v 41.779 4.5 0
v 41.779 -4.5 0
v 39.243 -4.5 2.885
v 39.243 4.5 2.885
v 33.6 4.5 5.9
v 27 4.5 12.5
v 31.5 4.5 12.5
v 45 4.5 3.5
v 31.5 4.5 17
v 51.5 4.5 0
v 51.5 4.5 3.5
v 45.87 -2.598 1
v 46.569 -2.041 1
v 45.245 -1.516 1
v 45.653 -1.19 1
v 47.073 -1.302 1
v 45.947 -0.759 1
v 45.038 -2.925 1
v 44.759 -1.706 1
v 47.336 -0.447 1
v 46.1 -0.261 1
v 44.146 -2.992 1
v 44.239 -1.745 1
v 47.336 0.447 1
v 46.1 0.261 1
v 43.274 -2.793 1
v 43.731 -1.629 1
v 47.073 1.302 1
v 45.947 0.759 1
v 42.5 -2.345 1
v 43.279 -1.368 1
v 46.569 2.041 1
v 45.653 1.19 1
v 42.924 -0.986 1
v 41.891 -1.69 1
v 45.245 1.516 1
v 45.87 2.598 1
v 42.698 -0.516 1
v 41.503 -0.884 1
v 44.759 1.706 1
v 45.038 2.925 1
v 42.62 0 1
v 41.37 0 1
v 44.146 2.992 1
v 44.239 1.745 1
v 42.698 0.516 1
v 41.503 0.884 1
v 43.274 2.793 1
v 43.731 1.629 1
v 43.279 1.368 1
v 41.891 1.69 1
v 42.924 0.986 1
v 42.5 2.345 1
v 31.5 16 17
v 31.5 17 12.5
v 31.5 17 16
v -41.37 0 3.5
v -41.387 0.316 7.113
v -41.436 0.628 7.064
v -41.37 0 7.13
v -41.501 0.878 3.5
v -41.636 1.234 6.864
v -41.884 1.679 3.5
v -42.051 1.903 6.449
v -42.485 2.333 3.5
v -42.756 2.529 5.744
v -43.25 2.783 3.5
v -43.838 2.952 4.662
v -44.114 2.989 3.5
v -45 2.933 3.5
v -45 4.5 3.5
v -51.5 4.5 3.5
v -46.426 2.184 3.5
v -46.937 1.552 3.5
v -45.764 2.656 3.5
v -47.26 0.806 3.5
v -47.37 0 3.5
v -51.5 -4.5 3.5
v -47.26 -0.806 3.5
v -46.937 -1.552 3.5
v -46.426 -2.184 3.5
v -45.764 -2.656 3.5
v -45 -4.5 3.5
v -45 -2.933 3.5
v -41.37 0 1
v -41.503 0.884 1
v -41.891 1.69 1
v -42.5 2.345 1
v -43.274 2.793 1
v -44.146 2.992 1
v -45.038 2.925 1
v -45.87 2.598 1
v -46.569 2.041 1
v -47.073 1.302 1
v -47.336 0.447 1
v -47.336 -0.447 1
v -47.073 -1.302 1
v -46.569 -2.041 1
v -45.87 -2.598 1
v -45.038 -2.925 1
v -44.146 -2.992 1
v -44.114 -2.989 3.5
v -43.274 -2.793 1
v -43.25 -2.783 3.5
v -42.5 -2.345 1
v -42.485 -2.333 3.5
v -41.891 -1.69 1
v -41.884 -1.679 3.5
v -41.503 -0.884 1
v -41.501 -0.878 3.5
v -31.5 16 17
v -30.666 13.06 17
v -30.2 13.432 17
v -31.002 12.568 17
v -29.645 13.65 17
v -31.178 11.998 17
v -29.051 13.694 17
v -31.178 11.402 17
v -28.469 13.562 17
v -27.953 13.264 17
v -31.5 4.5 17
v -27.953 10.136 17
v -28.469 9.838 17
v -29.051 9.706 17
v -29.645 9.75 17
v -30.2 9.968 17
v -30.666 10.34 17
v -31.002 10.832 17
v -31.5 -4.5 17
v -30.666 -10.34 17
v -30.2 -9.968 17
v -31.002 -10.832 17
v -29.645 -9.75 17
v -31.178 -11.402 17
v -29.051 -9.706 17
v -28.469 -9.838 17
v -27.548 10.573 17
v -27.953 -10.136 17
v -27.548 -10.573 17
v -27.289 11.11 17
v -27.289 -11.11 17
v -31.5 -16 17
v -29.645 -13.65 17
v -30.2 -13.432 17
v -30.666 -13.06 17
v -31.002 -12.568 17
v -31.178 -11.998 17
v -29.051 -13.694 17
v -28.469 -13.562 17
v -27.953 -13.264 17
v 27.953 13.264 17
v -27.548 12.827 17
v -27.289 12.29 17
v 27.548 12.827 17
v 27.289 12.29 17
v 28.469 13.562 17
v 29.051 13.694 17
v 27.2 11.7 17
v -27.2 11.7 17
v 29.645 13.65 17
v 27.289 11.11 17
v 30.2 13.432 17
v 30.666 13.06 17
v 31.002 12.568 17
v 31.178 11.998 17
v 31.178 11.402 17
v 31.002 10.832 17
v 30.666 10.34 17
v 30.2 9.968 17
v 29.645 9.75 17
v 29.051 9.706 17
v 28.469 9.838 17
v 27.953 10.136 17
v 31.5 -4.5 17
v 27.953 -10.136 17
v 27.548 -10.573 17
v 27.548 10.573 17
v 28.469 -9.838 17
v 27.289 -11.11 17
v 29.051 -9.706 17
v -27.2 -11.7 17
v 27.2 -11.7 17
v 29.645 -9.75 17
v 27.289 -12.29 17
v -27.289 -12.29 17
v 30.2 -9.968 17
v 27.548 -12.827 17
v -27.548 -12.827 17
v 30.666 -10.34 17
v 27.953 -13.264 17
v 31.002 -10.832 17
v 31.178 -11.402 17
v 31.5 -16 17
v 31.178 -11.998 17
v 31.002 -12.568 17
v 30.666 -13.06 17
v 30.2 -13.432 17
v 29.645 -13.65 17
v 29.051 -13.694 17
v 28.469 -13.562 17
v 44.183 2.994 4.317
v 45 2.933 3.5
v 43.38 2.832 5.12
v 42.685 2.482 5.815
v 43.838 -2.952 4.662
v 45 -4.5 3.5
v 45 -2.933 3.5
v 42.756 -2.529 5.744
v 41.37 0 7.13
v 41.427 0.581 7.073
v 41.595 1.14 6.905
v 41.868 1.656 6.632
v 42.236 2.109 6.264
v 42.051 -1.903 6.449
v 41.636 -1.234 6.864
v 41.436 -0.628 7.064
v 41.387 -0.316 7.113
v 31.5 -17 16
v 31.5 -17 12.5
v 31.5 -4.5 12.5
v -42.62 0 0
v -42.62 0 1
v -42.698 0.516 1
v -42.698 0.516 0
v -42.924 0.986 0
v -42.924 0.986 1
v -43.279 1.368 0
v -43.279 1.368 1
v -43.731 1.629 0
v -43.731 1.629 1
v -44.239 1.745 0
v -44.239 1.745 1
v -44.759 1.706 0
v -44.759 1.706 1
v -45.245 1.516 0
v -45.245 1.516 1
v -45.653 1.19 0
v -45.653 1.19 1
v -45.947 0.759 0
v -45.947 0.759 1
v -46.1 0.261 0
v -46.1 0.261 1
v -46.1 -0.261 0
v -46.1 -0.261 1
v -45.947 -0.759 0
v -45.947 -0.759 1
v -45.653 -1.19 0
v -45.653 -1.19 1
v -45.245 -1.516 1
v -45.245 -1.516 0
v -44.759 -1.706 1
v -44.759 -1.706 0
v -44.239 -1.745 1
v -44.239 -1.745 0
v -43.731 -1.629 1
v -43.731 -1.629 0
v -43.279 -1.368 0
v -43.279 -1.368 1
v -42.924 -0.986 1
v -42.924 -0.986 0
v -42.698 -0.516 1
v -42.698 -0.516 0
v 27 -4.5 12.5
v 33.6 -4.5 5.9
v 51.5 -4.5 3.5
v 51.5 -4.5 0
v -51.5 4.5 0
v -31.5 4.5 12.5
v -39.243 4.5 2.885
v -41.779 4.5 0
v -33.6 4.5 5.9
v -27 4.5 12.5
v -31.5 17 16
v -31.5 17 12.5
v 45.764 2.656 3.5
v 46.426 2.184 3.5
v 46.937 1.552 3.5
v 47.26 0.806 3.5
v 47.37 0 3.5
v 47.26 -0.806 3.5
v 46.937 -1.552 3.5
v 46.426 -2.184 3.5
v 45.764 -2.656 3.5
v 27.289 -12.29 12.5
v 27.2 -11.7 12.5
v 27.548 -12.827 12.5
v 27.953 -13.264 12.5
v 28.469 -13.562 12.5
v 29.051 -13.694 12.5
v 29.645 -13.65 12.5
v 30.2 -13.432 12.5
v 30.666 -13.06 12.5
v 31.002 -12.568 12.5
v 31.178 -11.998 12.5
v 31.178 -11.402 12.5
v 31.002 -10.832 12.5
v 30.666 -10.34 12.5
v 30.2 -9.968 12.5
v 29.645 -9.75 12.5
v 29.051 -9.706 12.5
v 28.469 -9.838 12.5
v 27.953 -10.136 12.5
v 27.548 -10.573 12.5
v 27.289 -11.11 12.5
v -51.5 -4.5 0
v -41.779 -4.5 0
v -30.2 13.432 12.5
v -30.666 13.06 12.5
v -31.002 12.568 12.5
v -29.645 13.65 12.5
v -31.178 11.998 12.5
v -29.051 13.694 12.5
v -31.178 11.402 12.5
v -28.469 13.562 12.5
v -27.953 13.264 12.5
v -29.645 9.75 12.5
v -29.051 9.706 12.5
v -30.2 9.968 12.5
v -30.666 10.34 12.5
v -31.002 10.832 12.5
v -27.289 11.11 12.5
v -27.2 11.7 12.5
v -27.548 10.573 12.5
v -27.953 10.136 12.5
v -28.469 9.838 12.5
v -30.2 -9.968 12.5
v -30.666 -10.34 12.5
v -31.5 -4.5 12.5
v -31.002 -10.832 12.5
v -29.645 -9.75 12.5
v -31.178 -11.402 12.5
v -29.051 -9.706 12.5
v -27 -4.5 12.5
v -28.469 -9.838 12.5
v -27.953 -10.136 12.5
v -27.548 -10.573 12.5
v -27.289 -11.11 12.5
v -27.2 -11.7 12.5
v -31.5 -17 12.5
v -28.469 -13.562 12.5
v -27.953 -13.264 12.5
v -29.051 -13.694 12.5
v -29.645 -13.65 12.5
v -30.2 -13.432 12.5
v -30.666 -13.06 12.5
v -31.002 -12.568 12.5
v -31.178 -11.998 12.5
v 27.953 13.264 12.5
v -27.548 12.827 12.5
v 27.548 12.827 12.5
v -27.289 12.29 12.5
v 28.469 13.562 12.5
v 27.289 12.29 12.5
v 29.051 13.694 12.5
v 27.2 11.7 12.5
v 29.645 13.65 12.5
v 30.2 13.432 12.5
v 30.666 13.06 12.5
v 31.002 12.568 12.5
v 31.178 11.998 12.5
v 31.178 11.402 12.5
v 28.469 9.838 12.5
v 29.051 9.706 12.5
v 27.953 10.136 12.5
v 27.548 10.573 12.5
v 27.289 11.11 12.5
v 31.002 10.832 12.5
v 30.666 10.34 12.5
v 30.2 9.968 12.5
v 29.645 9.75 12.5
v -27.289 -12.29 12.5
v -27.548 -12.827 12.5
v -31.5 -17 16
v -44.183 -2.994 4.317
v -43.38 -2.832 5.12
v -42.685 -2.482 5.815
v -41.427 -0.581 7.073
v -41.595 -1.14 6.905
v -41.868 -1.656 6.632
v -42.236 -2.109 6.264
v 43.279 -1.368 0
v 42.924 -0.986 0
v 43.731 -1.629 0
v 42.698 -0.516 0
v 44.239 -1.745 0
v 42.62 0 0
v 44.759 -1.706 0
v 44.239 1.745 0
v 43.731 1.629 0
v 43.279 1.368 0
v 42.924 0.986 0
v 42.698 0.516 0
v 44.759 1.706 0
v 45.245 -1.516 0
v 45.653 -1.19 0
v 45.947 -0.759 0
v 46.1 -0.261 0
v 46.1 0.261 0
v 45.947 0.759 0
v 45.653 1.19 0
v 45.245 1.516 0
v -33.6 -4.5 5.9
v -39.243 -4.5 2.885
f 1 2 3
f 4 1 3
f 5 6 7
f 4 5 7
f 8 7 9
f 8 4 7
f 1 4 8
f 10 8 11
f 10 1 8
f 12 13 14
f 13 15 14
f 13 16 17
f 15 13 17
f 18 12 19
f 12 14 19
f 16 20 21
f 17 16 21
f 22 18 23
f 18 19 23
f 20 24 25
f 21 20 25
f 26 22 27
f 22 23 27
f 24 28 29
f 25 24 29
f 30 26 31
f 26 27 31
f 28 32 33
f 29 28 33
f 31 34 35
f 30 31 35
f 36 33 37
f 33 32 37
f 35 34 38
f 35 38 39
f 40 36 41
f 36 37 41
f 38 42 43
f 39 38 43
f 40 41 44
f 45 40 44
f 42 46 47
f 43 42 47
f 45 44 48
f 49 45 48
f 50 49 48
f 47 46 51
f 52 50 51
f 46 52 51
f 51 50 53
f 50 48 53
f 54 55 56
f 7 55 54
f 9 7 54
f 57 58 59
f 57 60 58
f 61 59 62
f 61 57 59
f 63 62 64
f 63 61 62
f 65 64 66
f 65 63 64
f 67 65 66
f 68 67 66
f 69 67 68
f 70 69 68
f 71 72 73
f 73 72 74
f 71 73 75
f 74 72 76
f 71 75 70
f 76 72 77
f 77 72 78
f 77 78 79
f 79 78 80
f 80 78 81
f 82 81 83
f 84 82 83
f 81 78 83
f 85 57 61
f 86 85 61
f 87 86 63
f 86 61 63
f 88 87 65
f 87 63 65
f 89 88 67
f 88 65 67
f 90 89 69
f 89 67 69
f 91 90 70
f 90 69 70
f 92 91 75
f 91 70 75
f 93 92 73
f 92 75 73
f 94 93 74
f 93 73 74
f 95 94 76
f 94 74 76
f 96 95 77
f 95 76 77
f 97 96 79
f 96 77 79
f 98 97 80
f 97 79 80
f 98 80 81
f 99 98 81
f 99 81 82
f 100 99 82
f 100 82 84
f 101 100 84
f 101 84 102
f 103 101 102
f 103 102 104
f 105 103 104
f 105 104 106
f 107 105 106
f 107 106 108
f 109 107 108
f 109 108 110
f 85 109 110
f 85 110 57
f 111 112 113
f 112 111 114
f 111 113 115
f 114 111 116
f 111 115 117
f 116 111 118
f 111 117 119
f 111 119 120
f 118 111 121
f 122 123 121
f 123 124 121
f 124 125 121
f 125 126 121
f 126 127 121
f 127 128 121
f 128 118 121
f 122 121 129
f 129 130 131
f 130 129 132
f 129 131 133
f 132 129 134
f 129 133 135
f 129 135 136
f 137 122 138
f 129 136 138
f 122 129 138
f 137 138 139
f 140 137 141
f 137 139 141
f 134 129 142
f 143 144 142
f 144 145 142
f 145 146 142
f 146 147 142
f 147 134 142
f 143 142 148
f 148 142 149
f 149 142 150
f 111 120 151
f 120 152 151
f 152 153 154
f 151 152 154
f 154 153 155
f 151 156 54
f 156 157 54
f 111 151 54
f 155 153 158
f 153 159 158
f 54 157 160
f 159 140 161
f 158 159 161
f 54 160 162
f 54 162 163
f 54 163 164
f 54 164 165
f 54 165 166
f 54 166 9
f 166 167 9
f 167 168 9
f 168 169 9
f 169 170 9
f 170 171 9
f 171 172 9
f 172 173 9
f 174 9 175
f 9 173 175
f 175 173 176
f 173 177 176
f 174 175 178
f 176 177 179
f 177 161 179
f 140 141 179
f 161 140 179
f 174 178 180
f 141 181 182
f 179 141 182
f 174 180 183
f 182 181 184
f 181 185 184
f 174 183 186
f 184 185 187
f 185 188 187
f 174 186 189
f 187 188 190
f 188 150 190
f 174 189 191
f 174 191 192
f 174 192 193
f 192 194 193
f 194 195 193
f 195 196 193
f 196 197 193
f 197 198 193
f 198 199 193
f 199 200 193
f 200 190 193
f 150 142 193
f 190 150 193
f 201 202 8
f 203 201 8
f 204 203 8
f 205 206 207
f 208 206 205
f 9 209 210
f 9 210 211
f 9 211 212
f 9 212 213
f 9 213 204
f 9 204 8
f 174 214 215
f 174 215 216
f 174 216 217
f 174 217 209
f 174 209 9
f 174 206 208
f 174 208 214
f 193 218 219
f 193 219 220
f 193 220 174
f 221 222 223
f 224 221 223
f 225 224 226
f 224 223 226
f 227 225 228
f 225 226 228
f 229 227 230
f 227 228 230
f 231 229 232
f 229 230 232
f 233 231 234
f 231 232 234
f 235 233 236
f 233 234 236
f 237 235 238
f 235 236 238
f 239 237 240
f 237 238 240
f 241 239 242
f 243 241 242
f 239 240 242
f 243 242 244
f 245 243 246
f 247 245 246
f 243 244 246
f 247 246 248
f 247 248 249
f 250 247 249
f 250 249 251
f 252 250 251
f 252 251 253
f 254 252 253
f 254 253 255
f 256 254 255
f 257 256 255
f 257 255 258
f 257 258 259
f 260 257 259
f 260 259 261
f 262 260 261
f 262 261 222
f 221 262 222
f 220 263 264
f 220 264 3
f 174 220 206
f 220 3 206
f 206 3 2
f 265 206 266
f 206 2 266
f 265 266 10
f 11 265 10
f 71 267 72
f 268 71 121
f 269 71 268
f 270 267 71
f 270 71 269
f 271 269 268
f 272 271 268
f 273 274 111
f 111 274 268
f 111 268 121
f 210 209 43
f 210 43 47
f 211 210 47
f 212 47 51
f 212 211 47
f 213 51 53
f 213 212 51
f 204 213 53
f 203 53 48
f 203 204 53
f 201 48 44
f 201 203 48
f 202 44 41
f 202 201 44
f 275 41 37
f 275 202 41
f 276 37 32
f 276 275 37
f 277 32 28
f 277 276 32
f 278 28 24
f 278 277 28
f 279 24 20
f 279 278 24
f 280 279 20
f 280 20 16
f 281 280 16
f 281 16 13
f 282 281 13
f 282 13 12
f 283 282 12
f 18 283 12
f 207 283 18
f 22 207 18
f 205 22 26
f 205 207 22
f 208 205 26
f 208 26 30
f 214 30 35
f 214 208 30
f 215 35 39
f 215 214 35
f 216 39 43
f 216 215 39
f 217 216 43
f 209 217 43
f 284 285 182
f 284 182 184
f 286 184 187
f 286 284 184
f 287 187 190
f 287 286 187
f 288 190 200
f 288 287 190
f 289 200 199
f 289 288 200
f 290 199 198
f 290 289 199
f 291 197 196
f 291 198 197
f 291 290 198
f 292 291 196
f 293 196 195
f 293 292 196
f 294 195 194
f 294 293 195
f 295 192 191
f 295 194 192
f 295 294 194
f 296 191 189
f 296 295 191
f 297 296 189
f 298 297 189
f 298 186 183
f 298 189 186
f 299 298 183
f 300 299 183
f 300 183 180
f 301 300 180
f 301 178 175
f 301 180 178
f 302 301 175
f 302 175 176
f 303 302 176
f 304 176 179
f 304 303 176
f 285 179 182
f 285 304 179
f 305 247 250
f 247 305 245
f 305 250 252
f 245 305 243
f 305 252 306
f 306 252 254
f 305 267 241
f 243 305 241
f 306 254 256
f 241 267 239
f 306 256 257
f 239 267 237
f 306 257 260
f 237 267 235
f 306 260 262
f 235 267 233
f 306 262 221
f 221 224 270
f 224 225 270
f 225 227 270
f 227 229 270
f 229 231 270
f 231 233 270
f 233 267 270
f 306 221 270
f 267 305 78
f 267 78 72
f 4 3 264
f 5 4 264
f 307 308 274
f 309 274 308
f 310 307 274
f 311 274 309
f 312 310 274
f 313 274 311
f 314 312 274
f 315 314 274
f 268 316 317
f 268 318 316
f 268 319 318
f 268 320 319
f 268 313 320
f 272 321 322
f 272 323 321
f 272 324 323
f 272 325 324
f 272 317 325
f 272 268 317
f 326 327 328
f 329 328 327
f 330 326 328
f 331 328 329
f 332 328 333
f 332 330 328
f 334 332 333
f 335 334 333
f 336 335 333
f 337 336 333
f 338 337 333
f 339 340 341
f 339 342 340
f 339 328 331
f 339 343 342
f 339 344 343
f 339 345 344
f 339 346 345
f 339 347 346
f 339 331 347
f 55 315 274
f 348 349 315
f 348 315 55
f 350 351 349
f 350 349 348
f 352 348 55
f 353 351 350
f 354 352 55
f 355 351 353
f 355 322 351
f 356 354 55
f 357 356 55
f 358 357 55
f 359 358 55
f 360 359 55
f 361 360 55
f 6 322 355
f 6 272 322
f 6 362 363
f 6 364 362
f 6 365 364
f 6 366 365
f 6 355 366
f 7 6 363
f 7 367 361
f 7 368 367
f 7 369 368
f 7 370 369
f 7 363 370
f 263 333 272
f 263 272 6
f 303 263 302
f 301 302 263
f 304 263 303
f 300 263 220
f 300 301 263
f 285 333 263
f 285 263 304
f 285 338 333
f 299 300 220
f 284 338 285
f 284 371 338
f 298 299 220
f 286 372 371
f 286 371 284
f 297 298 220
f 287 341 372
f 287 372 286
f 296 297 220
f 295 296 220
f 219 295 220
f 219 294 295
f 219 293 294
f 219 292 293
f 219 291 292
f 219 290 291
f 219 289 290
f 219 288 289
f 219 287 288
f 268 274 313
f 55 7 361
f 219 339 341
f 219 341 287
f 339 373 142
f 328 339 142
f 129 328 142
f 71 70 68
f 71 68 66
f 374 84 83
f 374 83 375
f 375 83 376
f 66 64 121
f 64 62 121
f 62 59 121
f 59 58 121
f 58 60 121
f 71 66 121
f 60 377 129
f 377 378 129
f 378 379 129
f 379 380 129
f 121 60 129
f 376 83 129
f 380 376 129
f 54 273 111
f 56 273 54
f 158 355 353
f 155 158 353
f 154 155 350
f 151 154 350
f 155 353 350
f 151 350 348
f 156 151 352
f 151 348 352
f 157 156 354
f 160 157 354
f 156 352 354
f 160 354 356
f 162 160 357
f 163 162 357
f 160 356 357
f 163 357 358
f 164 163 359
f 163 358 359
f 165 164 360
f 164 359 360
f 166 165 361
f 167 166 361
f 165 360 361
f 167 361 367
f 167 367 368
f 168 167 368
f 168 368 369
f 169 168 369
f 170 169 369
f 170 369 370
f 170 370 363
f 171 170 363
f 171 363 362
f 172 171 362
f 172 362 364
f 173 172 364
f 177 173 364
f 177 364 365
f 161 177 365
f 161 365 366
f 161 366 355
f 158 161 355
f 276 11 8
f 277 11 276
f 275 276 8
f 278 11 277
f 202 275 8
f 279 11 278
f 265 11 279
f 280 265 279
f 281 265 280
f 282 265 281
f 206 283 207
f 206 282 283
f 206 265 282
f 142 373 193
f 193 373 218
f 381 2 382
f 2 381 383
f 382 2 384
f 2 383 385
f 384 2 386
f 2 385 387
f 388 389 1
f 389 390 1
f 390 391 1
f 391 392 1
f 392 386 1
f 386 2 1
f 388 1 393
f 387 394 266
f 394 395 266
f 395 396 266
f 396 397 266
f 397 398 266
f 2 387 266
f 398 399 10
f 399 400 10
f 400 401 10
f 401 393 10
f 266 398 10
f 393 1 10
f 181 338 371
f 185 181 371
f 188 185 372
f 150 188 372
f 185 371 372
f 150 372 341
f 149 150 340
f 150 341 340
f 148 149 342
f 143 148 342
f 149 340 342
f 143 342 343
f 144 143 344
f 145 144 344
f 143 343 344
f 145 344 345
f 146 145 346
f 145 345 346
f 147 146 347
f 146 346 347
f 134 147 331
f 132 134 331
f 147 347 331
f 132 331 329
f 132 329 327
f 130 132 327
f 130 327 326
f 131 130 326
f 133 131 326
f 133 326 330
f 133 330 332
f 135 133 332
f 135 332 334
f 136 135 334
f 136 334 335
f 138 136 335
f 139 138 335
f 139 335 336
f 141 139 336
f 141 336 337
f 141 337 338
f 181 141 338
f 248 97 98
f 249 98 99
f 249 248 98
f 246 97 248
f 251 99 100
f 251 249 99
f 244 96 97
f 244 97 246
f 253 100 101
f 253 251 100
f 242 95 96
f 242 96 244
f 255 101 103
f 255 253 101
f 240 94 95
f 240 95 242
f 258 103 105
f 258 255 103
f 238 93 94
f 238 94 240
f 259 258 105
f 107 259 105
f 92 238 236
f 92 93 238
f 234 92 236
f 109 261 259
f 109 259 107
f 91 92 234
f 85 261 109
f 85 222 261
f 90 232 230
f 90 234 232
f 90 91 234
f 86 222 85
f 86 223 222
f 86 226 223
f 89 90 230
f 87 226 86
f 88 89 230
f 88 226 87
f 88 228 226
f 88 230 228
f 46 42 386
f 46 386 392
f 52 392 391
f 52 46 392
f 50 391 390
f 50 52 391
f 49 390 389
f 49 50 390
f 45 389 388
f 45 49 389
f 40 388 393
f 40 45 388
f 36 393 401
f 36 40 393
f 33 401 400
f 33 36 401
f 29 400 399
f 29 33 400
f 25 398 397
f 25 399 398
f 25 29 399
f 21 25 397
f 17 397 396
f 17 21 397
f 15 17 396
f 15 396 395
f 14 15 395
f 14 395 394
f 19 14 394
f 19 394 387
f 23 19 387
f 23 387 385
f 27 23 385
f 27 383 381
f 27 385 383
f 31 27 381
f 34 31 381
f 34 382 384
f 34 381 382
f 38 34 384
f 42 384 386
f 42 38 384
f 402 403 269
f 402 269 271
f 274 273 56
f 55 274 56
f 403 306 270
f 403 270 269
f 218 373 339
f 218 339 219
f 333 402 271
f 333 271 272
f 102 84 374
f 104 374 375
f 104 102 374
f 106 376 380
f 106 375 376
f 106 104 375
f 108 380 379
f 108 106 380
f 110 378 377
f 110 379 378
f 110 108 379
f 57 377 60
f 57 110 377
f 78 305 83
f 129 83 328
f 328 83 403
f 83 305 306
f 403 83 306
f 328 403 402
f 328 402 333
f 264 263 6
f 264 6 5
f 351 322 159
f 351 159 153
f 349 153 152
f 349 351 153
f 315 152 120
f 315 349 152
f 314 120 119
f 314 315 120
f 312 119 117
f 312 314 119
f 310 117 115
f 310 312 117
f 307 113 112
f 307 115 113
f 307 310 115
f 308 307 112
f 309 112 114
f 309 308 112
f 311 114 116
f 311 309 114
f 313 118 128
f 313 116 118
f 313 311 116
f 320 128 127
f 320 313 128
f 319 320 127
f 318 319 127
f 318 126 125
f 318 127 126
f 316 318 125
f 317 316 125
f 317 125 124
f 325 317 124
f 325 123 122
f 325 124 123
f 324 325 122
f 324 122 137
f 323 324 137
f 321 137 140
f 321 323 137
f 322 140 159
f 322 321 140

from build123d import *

# Parameters (mm, degrees)
SKETCH_W                      = 103
SKETCH_H                      = 9
PAD_DEPTH                     = 17
POCKET_DEPTH                  = 5.5
POCKET001_DEPTH               = 4.5
SKETCH003_W                   = 63
SKETCH003_H                   = 4.5
PAD001_DEPTH                  = 17
SKETCH005_R                   = 3
POCKET002_DEPTH               = 2.5
POCKET002_DEPTH_BACK          = 5
SKETCH006_R                   = 1.75
POCKET003_DEPTH               = 5
SKETCH007_R                   = 2
POCKET004_DEPTH               = 28
SKETCH007_MIRRORED002_2_R     = 2
POCKET004_MIRRORED002_2_DEPTH = 28
POCKET005_DEPTH               = 7
CHAMFER_SIZE                  = 1


with BuildPart() as part:
    # Sketch → Pad (new body)
    with BuildSketch(Plane.XY):
        Rectangle(SKETCH_W, SKETCH_H)
    extrude(amount=PAD_DEPTH)

    # Sketch001 → Pocket (cut, symmetric)
    with BuildSketch(Plane.XZ):
        Polygon((-39.5, 0), (-27, 12.5), (27, 12.5), (39.5, 0), align=None)
    extrude(amount=POCKET_DEPTH, both=True, mode=Mode.SUBTRACT)

    # Sketch002 → Pocket001 (cut, symmetric)
    with BuildSketch(Plane.XZ):
        Polygon((-51.88, 3.5), (-45, 3.5), (-31, 17.5), (-51.88, 17.5), align=None)
    pocket001 = extrude(amount=POCKET001_DEPTH, both=True, mode=Mode.SUBTRACT)

    # Mirrored: Pocket001 across Sketch002 V_Axis
    add(pocket001.mirror(Plane(origin=(0, 0, 0), x_dir=(0, -1, 0), z_dir=(1, 0, 0))), mode=Mode.SUBTRACT)

    # Sketch003 → Pad001 (join, symmetric)
    with BuildSketch(Plane.XZ):
        with Locations((0, 14.75)):
            Rectangle(SKETCH003_W, SKETCH003_H)
    extrude(amount=PAD001_DEPTH, both=True)

    # Sketch005 (on DatumPlane) → Pocket002 (cut, two sides)
    with BuildSketch(Plane.XY.offset(3.5)) as pocket002_sk:
        with Locations((-44.37, 0)):
            Circle(SKETCH005_R)
    pocket002 = extrude(amount=-POCKET002_DEPTH, mode=Mode.SUBTRACT) + extrude(pocket002_sk.sketch, amount=POCKET002_DEPTH_BACK, mode=Mode.SUBTRACT)

    # Sketch006 (on DatumPlane) → Pocket003 (cut)
    with BuildSketch(Plane.XY.offset(3.5)):
        with Locations((-44.37, 0)):
            Circle(SKETCH006_R)
    pocket003 = extrude(amount=-POCKET003_DEPTH, mode=Mode.SUBTRACT)

    # Mirrored001: Pocket003, Pocket002 across Sketch006 V_Axis
    add(pocket003.mirror(Plane(origin=(0, 0, 3.5), x_dir=(0, 0, 1), z_dir=(1, 0, 0))), mode=Mode.SUBTRACT)
    add(pocket002.mirror(Plane(origin=(0, 0, 3.5), x_dir=(0, 0, 1), z_dir=(1, 0, 0))), mode=Mode.SUBTRACT)

    # Sketch007 → Pocket004 (cut)
    with BuildSketch(Plane.XY):
        with Locations((-29.2, 11.7)):
            Circle(SKETCH007_R)
    pocket004 = extrude(amount=POCKET004_DEPTH, mode=Mode.SUBTRACT)

    # Sketch007 Mirrored002 2 → Pocket004 Mirrored002 2 (cut)
    with BuildSketch(Plane(origin=(0, 0, 0), x_dir=(-1, 0, 0), z_dir=(0, 0, -1))):
        with Locations((-29.2, 11.7)):
            Circle(SKETCH007_MIRRORED002_2_R)
    pocket004_mirrored002_2 = extrude(amount=-POCKET004_MIRRORED002_2_DEPTH, mode=Mode.SUBTRACT)

    # Mirrored003: Pocket004, Pocket004 Mirrored002 2 across XZ
    add(pocket004.mirror(Plane.XZ), mode=Mode.SUBTRACT)
    add(pocket004_mirrored002_2.mirror(Plane.XZ), mode=Mode.SUBTRACT)

    # Sketch008 → Pocket005 (cut, symmetric)
    with BuildSketch(Plane.XZ):
        Polygon((-41.778629, 0), (-39.243446, 2.885116), (-33.286407, 6.06738), (-33.286407, 0), align=None)
    pocket005 = extrude(amount=POCKET005_DEPTH, both=True, mode=Mode.SUBTRACT)

    # Mirrored004: Pocket005 across Sketch008 V_Axis
    add(pocket005.mirror(Plane(origin=(0, 0, 0), x_dir=(0, -1, 0), z_dir=(1, 0, 0))), mode=Mode.SUBTRACT)

    # Chamfer
    chamfer_edges = [part.edges().sort_by_distance(p)[0] for p in [
        (0, -17, 17),
        (0, 17, 17),
    ]]
    chamfer(chamfer_edges, length=CHAMFER_SIZE)


solid = part.part
